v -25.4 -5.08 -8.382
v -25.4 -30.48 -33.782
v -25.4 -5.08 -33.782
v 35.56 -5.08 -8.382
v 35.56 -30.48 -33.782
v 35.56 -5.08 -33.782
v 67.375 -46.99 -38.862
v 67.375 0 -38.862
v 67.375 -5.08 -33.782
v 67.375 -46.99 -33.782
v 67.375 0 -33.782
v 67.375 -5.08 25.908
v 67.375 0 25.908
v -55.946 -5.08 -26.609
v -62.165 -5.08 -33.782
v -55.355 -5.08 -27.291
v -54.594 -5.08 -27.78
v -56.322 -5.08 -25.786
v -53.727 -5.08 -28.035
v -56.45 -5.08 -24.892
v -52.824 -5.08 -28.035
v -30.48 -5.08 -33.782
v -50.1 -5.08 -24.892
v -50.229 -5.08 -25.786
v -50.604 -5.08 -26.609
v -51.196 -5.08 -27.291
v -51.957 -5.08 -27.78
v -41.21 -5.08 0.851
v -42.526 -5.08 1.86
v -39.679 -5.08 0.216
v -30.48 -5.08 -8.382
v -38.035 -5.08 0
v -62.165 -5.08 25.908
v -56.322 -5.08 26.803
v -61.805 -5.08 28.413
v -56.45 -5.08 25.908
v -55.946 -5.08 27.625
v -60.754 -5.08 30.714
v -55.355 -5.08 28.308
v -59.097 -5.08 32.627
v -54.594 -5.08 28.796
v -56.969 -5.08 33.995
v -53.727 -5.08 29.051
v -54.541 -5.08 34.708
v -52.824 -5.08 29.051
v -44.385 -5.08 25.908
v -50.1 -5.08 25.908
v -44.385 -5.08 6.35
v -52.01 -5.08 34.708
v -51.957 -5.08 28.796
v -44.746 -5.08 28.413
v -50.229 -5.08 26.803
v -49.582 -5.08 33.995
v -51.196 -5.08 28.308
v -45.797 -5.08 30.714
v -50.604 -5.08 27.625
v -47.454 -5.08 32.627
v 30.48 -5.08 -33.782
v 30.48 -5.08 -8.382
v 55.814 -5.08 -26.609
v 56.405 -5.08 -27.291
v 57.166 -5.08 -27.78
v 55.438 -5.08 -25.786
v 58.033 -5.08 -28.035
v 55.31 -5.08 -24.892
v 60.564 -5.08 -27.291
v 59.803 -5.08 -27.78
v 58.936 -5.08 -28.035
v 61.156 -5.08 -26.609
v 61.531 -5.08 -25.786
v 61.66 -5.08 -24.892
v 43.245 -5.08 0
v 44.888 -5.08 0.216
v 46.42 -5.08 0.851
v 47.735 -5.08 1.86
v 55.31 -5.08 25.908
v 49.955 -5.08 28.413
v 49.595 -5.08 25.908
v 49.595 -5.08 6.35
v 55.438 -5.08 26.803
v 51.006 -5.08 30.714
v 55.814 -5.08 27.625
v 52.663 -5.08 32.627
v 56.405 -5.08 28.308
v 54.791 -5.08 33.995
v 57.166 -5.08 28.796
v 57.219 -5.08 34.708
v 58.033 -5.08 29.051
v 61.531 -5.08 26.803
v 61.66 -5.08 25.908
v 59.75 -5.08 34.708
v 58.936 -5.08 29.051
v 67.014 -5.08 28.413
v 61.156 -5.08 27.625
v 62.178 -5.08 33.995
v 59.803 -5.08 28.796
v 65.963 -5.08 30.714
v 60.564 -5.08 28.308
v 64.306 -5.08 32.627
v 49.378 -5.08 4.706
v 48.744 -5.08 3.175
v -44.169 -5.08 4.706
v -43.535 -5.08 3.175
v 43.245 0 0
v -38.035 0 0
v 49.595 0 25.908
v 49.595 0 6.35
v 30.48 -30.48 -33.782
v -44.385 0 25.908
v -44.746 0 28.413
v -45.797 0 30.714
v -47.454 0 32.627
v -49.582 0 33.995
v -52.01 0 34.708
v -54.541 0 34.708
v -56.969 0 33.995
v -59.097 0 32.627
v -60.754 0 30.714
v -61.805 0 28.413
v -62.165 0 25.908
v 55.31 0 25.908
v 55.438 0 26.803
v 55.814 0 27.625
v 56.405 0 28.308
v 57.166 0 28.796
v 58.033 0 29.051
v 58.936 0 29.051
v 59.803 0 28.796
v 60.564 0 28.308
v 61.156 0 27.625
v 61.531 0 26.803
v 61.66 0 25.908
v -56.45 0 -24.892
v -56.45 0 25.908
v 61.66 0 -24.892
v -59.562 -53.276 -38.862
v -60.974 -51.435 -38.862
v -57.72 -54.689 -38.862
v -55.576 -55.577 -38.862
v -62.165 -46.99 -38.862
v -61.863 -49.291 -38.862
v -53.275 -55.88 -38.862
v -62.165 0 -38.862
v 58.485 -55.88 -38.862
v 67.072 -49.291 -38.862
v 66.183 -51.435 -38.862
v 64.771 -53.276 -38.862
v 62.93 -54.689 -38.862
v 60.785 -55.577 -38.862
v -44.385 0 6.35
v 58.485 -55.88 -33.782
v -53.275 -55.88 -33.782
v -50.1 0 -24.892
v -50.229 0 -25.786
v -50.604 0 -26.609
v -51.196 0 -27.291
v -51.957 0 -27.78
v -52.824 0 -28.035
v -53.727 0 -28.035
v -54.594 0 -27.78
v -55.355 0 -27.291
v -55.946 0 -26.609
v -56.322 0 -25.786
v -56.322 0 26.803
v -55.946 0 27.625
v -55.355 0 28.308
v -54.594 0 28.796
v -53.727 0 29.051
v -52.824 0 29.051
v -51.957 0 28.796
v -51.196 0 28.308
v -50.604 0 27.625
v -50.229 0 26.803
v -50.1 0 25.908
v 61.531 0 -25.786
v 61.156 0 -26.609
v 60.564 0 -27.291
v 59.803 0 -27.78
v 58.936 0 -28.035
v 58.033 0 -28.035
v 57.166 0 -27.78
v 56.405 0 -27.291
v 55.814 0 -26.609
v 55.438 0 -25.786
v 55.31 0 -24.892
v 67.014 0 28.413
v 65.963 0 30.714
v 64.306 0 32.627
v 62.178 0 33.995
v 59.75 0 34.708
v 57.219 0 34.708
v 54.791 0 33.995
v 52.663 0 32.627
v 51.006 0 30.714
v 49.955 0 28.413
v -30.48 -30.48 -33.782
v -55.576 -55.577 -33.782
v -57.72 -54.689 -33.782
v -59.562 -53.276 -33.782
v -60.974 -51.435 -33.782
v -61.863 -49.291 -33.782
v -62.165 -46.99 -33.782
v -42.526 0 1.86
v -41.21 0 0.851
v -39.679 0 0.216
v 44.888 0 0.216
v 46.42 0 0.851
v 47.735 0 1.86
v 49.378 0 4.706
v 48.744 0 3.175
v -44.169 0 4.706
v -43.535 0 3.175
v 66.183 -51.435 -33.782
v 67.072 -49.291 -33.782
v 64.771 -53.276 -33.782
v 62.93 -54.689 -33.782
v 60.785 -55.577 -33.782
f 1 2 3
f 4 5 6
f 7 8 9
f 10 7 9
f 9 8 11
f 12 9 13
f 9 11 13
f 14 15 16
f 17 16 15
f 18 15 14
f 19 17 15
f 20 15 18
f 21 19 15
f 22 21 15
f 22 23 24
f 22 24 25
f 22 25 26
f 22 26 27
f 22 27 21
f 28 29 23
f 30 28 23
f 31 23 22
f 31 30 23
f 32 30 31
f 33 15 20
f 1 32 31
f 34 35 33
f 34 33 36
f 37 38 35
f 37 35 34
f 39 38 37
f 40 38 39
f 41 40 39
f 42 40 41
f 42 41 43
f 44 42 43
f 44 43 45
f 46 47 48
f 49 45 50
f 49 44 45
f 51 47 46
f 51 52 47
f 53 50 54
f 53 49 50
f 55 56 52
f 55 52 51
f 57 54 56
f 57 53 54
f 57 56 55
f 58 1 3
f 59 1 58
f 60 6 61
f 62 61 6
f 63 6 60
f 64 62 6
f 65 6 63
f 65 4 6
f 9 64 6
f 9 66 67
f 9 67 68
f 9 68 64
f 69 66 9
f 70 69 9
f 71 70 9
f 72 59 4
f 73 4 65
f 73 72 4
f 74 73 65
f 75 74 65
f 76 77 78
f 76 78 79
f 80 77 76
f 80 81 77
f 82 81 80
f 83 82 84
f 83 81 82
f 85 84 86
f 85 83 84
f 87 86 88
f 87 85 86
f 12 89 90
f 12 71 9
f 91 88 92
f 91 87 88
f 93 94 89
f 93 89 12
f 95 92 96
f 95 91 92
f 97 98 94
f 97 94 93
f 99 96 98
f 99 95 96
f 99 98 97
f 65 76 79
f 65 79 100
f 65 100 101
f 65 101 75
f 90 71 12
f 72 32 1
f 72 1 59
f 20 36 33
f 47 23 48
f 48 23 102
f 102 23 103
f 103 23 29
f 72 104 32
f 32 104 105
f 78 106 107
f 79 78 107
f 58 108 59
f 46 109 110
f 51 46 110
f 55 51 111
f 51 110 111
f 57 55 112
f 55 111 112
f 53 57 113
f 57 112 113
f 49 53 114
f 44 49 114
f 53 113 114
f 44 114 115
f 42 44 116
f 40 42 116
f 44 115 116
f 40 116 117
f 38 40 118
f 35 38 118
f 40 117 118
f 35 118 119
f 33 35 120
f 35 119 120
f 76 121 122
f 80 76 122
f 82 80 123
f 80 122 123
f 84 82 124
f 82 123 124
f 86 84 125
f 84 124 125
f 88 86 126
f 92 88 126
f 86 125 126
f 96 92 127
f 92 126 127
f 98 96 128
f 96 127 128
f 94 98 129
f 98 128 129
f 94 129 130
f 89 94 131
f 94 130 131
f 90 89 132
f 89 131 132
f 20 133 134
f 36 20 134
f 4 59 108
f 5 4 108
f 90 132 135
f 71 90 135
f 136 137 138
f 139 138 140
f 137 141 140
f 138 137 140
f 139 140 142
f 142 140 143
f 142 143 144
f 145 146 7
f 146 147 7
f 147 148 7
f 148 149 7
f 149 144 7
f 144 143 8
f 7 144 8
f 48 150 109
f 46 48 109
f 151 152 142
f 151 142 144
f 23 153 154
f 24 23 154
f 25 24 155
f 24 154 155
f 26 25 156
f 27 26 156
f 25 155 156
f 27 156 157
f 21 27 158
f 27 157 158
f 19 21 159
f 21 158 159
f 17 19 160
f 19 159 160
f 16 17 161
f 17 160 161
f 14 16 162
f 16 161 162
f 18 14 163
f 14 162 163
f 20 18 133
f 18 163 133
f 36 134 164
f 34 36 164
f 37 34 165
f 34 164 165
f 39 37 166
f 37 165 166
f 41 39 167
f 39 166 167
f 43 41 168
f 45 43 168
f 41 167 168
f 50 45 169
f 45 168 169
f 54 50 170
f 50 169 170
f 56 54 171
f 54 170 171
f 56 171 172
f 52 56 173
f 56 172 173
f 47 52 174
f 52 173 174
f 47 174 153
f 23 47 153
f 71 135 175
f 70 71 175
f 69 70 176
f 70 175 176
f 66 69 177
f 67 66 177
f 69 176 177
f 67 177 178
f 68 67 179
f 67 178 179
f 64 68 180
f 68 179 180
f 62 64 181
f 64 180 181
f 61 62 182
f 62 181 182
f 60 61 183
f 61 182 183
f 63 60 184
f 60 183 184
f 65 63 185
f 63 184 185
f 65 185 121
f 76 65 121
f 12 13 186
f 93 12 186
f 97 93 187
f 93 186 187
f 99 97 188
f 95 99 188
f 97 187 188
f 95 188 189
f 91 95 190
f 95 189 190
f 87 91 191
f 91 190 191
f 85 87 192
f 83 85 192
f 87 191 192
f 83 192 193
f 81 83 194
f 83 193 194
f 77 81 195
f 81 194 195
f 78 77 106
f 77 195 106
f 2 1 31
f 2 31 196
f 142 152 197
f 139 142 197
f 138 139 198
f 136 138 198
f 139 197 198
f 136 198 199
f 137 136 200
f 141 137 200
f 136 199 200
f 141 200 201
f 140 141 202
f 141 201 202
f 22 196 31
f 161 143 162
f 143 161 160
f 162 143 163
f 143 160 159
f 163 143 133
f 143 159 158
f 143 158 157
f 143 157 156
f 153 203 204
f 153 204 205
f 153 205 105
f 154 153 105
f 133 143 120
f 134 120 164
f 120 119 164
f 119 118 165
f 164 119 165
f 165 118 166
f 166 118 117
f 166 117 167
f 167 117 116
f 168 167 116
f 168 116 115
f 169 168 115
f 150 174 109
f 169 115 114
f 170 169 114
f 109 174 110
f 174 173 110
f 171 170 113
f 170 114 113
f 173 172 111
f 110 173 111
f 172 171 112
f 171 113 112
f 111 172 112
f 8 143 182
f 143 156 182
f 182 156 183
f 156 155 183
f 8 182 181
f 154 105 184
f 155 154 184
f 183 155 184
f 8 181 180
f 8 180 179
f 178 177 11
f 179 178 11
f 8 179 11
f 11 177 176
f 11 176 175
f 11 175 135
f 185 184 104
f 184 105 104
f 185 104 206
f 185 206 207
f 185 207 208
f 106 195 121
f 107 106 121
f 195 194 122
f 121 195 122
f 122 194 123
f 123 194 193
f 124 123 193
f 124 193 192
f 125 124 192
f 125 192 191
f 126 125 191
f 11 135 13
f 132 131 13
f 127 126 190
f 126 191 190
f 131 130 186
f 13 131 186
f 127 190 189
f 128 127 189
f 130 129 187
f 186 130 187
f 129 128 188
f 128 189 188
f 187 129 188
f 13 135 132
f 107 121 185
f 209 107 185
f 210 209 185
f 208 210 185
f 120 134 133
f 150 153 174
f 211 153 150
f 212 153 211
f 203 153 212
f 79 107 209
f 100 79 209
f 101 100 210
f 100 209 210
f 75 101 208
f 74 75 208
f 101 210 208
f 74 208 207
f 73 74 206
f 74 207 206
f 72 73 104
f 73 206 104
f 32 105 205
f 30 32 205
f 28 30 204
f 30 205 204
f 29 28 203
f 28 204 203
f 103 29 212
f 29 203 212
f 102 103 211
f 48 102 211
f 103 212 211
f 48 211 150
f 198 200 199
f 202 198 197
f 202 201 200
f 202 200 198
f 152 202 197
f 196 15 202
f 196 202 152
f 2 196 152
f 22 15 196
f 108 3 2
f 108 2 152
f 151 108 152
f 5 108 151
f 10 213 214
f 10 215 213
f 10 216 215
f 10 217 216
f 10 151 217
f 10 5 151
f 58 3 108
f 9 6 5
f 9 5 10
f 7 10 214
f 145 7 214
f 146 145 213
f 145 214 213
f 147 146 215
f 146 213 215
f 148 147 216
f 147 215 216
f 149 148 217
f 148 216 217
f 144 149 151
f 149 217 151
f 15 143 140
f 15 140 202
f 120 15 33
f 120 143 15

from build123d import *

# Parameters (mm, degrees)
F1_DEPTH = 5.08
F0_W     = 129.5400008702
F0_H     = 5.08
F2_DEPTH = 55.88
F4_DEPTH = 5.08
F6_START = 30.48
F6_DEPTH = 5.08
F7_START = -25.4
F7_DEPTH = 5.08


# Not quite as in the source:
# - a feature names something its author has since deleted; it is built from what else it names


with BuildPart() as f1:
    # F0 (on Front) → F1 (new body)
    with BuildSketch(Plane.XZ):
        with BuildLine():
            Line((-62.1654726565, 25.9080137503), (-62.1654726565, -33.7819862497))
            Line((-62.1654726565, -33.7819862497), (67.3745282138, -33.7819862497))
            Line((67.3745282138, -33.7819862497), (67.3745282138, 25.9080137503))
            ThreePointArc((67.3745282138, 25.9080137503), (58.4845213386, 34.7980137503), (49.5945282137, 25.908))
            Line((49.5945282137, 25.908), (49.5945282137, 6.35))
            ThreePointArc((49.5945282137, 6.35), (47.7346562743, 1.8598719395), (43.2445282137, 0))
            Line((43.2445282137, 0), (-38.0354726565, 0))
            ThreePointArc((-38.0354726565, 0), (-42.525600717, 1.8598719395), (-44.3854726565, 6.35))
            Line((-44.3854726565, 6.35), (-44.3854726565, 25.908))
            ThreePointArc((-44.3854726565, 25.908), (-53.2754657813, 34.7980137503), (-62.1654726565, 25.9080137503))
        make_face()
        with BuildLine():
            ThreePointArc((-56.4504726565, 25.9080137503), (-53.2754726565, 29.0830137503), (-50.1004726565, 25.9080137503))
            Line((-50.1004726565, 25.9080137503), (-50.1004726565, -24.8919862497))
            ThreePointArc((-50.1004726565, -24.8919862497), (-53.2754726565, -28.0669862497), (-56.4504726565, -24.8919862497))
            Line((-56.4504726565, -24.8919862497), (-56.4504726565, 25.9080137503))
        make_face(mode=Mode.SUBTRACT)
        with BuildLine():
            ThreePointArc((55.3095273435, 25.9080137503), (58.4845273435, 29.0830137503), (61.6595273435, 25.9080137503))
            Line((61.6595273435, 25.9080137503), (61.6595273435, -24.8919862497))
            ThreePointArc((61.6595273435, -24.8919862497), (58.4845273435, -28.0669862497), (55.3095273435, -24.8919862497))
            Line((55.3095273435, -24.8919862497), (55.3095273435, 25.9080137503))
        make_face(mode=Mode.SUBTRACT)
    extrude(amount=F1_DEPTH)

    # F0 (on Front) → F2 (join)
    with BuildSketch(Plane.XZ):
        with Locations((2.6045277786, -36.3219862497)):
            Rectangle(F0_W, F0_H)
    extrude(amount=F2_DEPTH)

    # F3 (on face) → F4 (cut)
    with BuildSketch(Plane.XY.offset(-33.7819862497)):
        with BuildLine():
            ThreePointArc((-53.2754726565, -55.88), (-59.5616519412, -53.2761792847), (-62.1654726565, -46.99))
            Line((-62.1654726565, -46.99), (-62.1654726565, -55.88))
            Line((-62.1654726565, -55.88), (-53.2754726565, -55.88))
        make_face()
        with BuildLine():
            ThreePointArc((67.3745282138, -46.99), (64.7707071908, -53.2761795924), (58.4845273435, -55.88))
            Line((58.4845273435, -55.88), (67.3745282138, -55.88))
            Line((67.3745282138, -55.88), (67.3745282138, -46.99))
        make_face()
    extrude(amount=-F4_DEPTH, mode=Mode.SUBTRACT)

    # F5 (on Right) → F6 (join)
    with BuildSketch(Plane.YZ.offset(F6_START)):
        Polygon((-5.08, -33.7819862497), (-5.08, -8.3819862497), (-30.48, -33.7819862497), align=None)
    extrude(amount=F6_DEPTH)

    # F5 (on Right) → F7 (join)
    with BuildSketch(Plane.YZ.offset(F7_START)):
        Polygon((-5.08, -33.7819862497), (-5.08, -8.3819862497), (-30.48, -33.7819862497), align=None)
    extrude(amount=-F7_DEPTH)


solid = f1.part
